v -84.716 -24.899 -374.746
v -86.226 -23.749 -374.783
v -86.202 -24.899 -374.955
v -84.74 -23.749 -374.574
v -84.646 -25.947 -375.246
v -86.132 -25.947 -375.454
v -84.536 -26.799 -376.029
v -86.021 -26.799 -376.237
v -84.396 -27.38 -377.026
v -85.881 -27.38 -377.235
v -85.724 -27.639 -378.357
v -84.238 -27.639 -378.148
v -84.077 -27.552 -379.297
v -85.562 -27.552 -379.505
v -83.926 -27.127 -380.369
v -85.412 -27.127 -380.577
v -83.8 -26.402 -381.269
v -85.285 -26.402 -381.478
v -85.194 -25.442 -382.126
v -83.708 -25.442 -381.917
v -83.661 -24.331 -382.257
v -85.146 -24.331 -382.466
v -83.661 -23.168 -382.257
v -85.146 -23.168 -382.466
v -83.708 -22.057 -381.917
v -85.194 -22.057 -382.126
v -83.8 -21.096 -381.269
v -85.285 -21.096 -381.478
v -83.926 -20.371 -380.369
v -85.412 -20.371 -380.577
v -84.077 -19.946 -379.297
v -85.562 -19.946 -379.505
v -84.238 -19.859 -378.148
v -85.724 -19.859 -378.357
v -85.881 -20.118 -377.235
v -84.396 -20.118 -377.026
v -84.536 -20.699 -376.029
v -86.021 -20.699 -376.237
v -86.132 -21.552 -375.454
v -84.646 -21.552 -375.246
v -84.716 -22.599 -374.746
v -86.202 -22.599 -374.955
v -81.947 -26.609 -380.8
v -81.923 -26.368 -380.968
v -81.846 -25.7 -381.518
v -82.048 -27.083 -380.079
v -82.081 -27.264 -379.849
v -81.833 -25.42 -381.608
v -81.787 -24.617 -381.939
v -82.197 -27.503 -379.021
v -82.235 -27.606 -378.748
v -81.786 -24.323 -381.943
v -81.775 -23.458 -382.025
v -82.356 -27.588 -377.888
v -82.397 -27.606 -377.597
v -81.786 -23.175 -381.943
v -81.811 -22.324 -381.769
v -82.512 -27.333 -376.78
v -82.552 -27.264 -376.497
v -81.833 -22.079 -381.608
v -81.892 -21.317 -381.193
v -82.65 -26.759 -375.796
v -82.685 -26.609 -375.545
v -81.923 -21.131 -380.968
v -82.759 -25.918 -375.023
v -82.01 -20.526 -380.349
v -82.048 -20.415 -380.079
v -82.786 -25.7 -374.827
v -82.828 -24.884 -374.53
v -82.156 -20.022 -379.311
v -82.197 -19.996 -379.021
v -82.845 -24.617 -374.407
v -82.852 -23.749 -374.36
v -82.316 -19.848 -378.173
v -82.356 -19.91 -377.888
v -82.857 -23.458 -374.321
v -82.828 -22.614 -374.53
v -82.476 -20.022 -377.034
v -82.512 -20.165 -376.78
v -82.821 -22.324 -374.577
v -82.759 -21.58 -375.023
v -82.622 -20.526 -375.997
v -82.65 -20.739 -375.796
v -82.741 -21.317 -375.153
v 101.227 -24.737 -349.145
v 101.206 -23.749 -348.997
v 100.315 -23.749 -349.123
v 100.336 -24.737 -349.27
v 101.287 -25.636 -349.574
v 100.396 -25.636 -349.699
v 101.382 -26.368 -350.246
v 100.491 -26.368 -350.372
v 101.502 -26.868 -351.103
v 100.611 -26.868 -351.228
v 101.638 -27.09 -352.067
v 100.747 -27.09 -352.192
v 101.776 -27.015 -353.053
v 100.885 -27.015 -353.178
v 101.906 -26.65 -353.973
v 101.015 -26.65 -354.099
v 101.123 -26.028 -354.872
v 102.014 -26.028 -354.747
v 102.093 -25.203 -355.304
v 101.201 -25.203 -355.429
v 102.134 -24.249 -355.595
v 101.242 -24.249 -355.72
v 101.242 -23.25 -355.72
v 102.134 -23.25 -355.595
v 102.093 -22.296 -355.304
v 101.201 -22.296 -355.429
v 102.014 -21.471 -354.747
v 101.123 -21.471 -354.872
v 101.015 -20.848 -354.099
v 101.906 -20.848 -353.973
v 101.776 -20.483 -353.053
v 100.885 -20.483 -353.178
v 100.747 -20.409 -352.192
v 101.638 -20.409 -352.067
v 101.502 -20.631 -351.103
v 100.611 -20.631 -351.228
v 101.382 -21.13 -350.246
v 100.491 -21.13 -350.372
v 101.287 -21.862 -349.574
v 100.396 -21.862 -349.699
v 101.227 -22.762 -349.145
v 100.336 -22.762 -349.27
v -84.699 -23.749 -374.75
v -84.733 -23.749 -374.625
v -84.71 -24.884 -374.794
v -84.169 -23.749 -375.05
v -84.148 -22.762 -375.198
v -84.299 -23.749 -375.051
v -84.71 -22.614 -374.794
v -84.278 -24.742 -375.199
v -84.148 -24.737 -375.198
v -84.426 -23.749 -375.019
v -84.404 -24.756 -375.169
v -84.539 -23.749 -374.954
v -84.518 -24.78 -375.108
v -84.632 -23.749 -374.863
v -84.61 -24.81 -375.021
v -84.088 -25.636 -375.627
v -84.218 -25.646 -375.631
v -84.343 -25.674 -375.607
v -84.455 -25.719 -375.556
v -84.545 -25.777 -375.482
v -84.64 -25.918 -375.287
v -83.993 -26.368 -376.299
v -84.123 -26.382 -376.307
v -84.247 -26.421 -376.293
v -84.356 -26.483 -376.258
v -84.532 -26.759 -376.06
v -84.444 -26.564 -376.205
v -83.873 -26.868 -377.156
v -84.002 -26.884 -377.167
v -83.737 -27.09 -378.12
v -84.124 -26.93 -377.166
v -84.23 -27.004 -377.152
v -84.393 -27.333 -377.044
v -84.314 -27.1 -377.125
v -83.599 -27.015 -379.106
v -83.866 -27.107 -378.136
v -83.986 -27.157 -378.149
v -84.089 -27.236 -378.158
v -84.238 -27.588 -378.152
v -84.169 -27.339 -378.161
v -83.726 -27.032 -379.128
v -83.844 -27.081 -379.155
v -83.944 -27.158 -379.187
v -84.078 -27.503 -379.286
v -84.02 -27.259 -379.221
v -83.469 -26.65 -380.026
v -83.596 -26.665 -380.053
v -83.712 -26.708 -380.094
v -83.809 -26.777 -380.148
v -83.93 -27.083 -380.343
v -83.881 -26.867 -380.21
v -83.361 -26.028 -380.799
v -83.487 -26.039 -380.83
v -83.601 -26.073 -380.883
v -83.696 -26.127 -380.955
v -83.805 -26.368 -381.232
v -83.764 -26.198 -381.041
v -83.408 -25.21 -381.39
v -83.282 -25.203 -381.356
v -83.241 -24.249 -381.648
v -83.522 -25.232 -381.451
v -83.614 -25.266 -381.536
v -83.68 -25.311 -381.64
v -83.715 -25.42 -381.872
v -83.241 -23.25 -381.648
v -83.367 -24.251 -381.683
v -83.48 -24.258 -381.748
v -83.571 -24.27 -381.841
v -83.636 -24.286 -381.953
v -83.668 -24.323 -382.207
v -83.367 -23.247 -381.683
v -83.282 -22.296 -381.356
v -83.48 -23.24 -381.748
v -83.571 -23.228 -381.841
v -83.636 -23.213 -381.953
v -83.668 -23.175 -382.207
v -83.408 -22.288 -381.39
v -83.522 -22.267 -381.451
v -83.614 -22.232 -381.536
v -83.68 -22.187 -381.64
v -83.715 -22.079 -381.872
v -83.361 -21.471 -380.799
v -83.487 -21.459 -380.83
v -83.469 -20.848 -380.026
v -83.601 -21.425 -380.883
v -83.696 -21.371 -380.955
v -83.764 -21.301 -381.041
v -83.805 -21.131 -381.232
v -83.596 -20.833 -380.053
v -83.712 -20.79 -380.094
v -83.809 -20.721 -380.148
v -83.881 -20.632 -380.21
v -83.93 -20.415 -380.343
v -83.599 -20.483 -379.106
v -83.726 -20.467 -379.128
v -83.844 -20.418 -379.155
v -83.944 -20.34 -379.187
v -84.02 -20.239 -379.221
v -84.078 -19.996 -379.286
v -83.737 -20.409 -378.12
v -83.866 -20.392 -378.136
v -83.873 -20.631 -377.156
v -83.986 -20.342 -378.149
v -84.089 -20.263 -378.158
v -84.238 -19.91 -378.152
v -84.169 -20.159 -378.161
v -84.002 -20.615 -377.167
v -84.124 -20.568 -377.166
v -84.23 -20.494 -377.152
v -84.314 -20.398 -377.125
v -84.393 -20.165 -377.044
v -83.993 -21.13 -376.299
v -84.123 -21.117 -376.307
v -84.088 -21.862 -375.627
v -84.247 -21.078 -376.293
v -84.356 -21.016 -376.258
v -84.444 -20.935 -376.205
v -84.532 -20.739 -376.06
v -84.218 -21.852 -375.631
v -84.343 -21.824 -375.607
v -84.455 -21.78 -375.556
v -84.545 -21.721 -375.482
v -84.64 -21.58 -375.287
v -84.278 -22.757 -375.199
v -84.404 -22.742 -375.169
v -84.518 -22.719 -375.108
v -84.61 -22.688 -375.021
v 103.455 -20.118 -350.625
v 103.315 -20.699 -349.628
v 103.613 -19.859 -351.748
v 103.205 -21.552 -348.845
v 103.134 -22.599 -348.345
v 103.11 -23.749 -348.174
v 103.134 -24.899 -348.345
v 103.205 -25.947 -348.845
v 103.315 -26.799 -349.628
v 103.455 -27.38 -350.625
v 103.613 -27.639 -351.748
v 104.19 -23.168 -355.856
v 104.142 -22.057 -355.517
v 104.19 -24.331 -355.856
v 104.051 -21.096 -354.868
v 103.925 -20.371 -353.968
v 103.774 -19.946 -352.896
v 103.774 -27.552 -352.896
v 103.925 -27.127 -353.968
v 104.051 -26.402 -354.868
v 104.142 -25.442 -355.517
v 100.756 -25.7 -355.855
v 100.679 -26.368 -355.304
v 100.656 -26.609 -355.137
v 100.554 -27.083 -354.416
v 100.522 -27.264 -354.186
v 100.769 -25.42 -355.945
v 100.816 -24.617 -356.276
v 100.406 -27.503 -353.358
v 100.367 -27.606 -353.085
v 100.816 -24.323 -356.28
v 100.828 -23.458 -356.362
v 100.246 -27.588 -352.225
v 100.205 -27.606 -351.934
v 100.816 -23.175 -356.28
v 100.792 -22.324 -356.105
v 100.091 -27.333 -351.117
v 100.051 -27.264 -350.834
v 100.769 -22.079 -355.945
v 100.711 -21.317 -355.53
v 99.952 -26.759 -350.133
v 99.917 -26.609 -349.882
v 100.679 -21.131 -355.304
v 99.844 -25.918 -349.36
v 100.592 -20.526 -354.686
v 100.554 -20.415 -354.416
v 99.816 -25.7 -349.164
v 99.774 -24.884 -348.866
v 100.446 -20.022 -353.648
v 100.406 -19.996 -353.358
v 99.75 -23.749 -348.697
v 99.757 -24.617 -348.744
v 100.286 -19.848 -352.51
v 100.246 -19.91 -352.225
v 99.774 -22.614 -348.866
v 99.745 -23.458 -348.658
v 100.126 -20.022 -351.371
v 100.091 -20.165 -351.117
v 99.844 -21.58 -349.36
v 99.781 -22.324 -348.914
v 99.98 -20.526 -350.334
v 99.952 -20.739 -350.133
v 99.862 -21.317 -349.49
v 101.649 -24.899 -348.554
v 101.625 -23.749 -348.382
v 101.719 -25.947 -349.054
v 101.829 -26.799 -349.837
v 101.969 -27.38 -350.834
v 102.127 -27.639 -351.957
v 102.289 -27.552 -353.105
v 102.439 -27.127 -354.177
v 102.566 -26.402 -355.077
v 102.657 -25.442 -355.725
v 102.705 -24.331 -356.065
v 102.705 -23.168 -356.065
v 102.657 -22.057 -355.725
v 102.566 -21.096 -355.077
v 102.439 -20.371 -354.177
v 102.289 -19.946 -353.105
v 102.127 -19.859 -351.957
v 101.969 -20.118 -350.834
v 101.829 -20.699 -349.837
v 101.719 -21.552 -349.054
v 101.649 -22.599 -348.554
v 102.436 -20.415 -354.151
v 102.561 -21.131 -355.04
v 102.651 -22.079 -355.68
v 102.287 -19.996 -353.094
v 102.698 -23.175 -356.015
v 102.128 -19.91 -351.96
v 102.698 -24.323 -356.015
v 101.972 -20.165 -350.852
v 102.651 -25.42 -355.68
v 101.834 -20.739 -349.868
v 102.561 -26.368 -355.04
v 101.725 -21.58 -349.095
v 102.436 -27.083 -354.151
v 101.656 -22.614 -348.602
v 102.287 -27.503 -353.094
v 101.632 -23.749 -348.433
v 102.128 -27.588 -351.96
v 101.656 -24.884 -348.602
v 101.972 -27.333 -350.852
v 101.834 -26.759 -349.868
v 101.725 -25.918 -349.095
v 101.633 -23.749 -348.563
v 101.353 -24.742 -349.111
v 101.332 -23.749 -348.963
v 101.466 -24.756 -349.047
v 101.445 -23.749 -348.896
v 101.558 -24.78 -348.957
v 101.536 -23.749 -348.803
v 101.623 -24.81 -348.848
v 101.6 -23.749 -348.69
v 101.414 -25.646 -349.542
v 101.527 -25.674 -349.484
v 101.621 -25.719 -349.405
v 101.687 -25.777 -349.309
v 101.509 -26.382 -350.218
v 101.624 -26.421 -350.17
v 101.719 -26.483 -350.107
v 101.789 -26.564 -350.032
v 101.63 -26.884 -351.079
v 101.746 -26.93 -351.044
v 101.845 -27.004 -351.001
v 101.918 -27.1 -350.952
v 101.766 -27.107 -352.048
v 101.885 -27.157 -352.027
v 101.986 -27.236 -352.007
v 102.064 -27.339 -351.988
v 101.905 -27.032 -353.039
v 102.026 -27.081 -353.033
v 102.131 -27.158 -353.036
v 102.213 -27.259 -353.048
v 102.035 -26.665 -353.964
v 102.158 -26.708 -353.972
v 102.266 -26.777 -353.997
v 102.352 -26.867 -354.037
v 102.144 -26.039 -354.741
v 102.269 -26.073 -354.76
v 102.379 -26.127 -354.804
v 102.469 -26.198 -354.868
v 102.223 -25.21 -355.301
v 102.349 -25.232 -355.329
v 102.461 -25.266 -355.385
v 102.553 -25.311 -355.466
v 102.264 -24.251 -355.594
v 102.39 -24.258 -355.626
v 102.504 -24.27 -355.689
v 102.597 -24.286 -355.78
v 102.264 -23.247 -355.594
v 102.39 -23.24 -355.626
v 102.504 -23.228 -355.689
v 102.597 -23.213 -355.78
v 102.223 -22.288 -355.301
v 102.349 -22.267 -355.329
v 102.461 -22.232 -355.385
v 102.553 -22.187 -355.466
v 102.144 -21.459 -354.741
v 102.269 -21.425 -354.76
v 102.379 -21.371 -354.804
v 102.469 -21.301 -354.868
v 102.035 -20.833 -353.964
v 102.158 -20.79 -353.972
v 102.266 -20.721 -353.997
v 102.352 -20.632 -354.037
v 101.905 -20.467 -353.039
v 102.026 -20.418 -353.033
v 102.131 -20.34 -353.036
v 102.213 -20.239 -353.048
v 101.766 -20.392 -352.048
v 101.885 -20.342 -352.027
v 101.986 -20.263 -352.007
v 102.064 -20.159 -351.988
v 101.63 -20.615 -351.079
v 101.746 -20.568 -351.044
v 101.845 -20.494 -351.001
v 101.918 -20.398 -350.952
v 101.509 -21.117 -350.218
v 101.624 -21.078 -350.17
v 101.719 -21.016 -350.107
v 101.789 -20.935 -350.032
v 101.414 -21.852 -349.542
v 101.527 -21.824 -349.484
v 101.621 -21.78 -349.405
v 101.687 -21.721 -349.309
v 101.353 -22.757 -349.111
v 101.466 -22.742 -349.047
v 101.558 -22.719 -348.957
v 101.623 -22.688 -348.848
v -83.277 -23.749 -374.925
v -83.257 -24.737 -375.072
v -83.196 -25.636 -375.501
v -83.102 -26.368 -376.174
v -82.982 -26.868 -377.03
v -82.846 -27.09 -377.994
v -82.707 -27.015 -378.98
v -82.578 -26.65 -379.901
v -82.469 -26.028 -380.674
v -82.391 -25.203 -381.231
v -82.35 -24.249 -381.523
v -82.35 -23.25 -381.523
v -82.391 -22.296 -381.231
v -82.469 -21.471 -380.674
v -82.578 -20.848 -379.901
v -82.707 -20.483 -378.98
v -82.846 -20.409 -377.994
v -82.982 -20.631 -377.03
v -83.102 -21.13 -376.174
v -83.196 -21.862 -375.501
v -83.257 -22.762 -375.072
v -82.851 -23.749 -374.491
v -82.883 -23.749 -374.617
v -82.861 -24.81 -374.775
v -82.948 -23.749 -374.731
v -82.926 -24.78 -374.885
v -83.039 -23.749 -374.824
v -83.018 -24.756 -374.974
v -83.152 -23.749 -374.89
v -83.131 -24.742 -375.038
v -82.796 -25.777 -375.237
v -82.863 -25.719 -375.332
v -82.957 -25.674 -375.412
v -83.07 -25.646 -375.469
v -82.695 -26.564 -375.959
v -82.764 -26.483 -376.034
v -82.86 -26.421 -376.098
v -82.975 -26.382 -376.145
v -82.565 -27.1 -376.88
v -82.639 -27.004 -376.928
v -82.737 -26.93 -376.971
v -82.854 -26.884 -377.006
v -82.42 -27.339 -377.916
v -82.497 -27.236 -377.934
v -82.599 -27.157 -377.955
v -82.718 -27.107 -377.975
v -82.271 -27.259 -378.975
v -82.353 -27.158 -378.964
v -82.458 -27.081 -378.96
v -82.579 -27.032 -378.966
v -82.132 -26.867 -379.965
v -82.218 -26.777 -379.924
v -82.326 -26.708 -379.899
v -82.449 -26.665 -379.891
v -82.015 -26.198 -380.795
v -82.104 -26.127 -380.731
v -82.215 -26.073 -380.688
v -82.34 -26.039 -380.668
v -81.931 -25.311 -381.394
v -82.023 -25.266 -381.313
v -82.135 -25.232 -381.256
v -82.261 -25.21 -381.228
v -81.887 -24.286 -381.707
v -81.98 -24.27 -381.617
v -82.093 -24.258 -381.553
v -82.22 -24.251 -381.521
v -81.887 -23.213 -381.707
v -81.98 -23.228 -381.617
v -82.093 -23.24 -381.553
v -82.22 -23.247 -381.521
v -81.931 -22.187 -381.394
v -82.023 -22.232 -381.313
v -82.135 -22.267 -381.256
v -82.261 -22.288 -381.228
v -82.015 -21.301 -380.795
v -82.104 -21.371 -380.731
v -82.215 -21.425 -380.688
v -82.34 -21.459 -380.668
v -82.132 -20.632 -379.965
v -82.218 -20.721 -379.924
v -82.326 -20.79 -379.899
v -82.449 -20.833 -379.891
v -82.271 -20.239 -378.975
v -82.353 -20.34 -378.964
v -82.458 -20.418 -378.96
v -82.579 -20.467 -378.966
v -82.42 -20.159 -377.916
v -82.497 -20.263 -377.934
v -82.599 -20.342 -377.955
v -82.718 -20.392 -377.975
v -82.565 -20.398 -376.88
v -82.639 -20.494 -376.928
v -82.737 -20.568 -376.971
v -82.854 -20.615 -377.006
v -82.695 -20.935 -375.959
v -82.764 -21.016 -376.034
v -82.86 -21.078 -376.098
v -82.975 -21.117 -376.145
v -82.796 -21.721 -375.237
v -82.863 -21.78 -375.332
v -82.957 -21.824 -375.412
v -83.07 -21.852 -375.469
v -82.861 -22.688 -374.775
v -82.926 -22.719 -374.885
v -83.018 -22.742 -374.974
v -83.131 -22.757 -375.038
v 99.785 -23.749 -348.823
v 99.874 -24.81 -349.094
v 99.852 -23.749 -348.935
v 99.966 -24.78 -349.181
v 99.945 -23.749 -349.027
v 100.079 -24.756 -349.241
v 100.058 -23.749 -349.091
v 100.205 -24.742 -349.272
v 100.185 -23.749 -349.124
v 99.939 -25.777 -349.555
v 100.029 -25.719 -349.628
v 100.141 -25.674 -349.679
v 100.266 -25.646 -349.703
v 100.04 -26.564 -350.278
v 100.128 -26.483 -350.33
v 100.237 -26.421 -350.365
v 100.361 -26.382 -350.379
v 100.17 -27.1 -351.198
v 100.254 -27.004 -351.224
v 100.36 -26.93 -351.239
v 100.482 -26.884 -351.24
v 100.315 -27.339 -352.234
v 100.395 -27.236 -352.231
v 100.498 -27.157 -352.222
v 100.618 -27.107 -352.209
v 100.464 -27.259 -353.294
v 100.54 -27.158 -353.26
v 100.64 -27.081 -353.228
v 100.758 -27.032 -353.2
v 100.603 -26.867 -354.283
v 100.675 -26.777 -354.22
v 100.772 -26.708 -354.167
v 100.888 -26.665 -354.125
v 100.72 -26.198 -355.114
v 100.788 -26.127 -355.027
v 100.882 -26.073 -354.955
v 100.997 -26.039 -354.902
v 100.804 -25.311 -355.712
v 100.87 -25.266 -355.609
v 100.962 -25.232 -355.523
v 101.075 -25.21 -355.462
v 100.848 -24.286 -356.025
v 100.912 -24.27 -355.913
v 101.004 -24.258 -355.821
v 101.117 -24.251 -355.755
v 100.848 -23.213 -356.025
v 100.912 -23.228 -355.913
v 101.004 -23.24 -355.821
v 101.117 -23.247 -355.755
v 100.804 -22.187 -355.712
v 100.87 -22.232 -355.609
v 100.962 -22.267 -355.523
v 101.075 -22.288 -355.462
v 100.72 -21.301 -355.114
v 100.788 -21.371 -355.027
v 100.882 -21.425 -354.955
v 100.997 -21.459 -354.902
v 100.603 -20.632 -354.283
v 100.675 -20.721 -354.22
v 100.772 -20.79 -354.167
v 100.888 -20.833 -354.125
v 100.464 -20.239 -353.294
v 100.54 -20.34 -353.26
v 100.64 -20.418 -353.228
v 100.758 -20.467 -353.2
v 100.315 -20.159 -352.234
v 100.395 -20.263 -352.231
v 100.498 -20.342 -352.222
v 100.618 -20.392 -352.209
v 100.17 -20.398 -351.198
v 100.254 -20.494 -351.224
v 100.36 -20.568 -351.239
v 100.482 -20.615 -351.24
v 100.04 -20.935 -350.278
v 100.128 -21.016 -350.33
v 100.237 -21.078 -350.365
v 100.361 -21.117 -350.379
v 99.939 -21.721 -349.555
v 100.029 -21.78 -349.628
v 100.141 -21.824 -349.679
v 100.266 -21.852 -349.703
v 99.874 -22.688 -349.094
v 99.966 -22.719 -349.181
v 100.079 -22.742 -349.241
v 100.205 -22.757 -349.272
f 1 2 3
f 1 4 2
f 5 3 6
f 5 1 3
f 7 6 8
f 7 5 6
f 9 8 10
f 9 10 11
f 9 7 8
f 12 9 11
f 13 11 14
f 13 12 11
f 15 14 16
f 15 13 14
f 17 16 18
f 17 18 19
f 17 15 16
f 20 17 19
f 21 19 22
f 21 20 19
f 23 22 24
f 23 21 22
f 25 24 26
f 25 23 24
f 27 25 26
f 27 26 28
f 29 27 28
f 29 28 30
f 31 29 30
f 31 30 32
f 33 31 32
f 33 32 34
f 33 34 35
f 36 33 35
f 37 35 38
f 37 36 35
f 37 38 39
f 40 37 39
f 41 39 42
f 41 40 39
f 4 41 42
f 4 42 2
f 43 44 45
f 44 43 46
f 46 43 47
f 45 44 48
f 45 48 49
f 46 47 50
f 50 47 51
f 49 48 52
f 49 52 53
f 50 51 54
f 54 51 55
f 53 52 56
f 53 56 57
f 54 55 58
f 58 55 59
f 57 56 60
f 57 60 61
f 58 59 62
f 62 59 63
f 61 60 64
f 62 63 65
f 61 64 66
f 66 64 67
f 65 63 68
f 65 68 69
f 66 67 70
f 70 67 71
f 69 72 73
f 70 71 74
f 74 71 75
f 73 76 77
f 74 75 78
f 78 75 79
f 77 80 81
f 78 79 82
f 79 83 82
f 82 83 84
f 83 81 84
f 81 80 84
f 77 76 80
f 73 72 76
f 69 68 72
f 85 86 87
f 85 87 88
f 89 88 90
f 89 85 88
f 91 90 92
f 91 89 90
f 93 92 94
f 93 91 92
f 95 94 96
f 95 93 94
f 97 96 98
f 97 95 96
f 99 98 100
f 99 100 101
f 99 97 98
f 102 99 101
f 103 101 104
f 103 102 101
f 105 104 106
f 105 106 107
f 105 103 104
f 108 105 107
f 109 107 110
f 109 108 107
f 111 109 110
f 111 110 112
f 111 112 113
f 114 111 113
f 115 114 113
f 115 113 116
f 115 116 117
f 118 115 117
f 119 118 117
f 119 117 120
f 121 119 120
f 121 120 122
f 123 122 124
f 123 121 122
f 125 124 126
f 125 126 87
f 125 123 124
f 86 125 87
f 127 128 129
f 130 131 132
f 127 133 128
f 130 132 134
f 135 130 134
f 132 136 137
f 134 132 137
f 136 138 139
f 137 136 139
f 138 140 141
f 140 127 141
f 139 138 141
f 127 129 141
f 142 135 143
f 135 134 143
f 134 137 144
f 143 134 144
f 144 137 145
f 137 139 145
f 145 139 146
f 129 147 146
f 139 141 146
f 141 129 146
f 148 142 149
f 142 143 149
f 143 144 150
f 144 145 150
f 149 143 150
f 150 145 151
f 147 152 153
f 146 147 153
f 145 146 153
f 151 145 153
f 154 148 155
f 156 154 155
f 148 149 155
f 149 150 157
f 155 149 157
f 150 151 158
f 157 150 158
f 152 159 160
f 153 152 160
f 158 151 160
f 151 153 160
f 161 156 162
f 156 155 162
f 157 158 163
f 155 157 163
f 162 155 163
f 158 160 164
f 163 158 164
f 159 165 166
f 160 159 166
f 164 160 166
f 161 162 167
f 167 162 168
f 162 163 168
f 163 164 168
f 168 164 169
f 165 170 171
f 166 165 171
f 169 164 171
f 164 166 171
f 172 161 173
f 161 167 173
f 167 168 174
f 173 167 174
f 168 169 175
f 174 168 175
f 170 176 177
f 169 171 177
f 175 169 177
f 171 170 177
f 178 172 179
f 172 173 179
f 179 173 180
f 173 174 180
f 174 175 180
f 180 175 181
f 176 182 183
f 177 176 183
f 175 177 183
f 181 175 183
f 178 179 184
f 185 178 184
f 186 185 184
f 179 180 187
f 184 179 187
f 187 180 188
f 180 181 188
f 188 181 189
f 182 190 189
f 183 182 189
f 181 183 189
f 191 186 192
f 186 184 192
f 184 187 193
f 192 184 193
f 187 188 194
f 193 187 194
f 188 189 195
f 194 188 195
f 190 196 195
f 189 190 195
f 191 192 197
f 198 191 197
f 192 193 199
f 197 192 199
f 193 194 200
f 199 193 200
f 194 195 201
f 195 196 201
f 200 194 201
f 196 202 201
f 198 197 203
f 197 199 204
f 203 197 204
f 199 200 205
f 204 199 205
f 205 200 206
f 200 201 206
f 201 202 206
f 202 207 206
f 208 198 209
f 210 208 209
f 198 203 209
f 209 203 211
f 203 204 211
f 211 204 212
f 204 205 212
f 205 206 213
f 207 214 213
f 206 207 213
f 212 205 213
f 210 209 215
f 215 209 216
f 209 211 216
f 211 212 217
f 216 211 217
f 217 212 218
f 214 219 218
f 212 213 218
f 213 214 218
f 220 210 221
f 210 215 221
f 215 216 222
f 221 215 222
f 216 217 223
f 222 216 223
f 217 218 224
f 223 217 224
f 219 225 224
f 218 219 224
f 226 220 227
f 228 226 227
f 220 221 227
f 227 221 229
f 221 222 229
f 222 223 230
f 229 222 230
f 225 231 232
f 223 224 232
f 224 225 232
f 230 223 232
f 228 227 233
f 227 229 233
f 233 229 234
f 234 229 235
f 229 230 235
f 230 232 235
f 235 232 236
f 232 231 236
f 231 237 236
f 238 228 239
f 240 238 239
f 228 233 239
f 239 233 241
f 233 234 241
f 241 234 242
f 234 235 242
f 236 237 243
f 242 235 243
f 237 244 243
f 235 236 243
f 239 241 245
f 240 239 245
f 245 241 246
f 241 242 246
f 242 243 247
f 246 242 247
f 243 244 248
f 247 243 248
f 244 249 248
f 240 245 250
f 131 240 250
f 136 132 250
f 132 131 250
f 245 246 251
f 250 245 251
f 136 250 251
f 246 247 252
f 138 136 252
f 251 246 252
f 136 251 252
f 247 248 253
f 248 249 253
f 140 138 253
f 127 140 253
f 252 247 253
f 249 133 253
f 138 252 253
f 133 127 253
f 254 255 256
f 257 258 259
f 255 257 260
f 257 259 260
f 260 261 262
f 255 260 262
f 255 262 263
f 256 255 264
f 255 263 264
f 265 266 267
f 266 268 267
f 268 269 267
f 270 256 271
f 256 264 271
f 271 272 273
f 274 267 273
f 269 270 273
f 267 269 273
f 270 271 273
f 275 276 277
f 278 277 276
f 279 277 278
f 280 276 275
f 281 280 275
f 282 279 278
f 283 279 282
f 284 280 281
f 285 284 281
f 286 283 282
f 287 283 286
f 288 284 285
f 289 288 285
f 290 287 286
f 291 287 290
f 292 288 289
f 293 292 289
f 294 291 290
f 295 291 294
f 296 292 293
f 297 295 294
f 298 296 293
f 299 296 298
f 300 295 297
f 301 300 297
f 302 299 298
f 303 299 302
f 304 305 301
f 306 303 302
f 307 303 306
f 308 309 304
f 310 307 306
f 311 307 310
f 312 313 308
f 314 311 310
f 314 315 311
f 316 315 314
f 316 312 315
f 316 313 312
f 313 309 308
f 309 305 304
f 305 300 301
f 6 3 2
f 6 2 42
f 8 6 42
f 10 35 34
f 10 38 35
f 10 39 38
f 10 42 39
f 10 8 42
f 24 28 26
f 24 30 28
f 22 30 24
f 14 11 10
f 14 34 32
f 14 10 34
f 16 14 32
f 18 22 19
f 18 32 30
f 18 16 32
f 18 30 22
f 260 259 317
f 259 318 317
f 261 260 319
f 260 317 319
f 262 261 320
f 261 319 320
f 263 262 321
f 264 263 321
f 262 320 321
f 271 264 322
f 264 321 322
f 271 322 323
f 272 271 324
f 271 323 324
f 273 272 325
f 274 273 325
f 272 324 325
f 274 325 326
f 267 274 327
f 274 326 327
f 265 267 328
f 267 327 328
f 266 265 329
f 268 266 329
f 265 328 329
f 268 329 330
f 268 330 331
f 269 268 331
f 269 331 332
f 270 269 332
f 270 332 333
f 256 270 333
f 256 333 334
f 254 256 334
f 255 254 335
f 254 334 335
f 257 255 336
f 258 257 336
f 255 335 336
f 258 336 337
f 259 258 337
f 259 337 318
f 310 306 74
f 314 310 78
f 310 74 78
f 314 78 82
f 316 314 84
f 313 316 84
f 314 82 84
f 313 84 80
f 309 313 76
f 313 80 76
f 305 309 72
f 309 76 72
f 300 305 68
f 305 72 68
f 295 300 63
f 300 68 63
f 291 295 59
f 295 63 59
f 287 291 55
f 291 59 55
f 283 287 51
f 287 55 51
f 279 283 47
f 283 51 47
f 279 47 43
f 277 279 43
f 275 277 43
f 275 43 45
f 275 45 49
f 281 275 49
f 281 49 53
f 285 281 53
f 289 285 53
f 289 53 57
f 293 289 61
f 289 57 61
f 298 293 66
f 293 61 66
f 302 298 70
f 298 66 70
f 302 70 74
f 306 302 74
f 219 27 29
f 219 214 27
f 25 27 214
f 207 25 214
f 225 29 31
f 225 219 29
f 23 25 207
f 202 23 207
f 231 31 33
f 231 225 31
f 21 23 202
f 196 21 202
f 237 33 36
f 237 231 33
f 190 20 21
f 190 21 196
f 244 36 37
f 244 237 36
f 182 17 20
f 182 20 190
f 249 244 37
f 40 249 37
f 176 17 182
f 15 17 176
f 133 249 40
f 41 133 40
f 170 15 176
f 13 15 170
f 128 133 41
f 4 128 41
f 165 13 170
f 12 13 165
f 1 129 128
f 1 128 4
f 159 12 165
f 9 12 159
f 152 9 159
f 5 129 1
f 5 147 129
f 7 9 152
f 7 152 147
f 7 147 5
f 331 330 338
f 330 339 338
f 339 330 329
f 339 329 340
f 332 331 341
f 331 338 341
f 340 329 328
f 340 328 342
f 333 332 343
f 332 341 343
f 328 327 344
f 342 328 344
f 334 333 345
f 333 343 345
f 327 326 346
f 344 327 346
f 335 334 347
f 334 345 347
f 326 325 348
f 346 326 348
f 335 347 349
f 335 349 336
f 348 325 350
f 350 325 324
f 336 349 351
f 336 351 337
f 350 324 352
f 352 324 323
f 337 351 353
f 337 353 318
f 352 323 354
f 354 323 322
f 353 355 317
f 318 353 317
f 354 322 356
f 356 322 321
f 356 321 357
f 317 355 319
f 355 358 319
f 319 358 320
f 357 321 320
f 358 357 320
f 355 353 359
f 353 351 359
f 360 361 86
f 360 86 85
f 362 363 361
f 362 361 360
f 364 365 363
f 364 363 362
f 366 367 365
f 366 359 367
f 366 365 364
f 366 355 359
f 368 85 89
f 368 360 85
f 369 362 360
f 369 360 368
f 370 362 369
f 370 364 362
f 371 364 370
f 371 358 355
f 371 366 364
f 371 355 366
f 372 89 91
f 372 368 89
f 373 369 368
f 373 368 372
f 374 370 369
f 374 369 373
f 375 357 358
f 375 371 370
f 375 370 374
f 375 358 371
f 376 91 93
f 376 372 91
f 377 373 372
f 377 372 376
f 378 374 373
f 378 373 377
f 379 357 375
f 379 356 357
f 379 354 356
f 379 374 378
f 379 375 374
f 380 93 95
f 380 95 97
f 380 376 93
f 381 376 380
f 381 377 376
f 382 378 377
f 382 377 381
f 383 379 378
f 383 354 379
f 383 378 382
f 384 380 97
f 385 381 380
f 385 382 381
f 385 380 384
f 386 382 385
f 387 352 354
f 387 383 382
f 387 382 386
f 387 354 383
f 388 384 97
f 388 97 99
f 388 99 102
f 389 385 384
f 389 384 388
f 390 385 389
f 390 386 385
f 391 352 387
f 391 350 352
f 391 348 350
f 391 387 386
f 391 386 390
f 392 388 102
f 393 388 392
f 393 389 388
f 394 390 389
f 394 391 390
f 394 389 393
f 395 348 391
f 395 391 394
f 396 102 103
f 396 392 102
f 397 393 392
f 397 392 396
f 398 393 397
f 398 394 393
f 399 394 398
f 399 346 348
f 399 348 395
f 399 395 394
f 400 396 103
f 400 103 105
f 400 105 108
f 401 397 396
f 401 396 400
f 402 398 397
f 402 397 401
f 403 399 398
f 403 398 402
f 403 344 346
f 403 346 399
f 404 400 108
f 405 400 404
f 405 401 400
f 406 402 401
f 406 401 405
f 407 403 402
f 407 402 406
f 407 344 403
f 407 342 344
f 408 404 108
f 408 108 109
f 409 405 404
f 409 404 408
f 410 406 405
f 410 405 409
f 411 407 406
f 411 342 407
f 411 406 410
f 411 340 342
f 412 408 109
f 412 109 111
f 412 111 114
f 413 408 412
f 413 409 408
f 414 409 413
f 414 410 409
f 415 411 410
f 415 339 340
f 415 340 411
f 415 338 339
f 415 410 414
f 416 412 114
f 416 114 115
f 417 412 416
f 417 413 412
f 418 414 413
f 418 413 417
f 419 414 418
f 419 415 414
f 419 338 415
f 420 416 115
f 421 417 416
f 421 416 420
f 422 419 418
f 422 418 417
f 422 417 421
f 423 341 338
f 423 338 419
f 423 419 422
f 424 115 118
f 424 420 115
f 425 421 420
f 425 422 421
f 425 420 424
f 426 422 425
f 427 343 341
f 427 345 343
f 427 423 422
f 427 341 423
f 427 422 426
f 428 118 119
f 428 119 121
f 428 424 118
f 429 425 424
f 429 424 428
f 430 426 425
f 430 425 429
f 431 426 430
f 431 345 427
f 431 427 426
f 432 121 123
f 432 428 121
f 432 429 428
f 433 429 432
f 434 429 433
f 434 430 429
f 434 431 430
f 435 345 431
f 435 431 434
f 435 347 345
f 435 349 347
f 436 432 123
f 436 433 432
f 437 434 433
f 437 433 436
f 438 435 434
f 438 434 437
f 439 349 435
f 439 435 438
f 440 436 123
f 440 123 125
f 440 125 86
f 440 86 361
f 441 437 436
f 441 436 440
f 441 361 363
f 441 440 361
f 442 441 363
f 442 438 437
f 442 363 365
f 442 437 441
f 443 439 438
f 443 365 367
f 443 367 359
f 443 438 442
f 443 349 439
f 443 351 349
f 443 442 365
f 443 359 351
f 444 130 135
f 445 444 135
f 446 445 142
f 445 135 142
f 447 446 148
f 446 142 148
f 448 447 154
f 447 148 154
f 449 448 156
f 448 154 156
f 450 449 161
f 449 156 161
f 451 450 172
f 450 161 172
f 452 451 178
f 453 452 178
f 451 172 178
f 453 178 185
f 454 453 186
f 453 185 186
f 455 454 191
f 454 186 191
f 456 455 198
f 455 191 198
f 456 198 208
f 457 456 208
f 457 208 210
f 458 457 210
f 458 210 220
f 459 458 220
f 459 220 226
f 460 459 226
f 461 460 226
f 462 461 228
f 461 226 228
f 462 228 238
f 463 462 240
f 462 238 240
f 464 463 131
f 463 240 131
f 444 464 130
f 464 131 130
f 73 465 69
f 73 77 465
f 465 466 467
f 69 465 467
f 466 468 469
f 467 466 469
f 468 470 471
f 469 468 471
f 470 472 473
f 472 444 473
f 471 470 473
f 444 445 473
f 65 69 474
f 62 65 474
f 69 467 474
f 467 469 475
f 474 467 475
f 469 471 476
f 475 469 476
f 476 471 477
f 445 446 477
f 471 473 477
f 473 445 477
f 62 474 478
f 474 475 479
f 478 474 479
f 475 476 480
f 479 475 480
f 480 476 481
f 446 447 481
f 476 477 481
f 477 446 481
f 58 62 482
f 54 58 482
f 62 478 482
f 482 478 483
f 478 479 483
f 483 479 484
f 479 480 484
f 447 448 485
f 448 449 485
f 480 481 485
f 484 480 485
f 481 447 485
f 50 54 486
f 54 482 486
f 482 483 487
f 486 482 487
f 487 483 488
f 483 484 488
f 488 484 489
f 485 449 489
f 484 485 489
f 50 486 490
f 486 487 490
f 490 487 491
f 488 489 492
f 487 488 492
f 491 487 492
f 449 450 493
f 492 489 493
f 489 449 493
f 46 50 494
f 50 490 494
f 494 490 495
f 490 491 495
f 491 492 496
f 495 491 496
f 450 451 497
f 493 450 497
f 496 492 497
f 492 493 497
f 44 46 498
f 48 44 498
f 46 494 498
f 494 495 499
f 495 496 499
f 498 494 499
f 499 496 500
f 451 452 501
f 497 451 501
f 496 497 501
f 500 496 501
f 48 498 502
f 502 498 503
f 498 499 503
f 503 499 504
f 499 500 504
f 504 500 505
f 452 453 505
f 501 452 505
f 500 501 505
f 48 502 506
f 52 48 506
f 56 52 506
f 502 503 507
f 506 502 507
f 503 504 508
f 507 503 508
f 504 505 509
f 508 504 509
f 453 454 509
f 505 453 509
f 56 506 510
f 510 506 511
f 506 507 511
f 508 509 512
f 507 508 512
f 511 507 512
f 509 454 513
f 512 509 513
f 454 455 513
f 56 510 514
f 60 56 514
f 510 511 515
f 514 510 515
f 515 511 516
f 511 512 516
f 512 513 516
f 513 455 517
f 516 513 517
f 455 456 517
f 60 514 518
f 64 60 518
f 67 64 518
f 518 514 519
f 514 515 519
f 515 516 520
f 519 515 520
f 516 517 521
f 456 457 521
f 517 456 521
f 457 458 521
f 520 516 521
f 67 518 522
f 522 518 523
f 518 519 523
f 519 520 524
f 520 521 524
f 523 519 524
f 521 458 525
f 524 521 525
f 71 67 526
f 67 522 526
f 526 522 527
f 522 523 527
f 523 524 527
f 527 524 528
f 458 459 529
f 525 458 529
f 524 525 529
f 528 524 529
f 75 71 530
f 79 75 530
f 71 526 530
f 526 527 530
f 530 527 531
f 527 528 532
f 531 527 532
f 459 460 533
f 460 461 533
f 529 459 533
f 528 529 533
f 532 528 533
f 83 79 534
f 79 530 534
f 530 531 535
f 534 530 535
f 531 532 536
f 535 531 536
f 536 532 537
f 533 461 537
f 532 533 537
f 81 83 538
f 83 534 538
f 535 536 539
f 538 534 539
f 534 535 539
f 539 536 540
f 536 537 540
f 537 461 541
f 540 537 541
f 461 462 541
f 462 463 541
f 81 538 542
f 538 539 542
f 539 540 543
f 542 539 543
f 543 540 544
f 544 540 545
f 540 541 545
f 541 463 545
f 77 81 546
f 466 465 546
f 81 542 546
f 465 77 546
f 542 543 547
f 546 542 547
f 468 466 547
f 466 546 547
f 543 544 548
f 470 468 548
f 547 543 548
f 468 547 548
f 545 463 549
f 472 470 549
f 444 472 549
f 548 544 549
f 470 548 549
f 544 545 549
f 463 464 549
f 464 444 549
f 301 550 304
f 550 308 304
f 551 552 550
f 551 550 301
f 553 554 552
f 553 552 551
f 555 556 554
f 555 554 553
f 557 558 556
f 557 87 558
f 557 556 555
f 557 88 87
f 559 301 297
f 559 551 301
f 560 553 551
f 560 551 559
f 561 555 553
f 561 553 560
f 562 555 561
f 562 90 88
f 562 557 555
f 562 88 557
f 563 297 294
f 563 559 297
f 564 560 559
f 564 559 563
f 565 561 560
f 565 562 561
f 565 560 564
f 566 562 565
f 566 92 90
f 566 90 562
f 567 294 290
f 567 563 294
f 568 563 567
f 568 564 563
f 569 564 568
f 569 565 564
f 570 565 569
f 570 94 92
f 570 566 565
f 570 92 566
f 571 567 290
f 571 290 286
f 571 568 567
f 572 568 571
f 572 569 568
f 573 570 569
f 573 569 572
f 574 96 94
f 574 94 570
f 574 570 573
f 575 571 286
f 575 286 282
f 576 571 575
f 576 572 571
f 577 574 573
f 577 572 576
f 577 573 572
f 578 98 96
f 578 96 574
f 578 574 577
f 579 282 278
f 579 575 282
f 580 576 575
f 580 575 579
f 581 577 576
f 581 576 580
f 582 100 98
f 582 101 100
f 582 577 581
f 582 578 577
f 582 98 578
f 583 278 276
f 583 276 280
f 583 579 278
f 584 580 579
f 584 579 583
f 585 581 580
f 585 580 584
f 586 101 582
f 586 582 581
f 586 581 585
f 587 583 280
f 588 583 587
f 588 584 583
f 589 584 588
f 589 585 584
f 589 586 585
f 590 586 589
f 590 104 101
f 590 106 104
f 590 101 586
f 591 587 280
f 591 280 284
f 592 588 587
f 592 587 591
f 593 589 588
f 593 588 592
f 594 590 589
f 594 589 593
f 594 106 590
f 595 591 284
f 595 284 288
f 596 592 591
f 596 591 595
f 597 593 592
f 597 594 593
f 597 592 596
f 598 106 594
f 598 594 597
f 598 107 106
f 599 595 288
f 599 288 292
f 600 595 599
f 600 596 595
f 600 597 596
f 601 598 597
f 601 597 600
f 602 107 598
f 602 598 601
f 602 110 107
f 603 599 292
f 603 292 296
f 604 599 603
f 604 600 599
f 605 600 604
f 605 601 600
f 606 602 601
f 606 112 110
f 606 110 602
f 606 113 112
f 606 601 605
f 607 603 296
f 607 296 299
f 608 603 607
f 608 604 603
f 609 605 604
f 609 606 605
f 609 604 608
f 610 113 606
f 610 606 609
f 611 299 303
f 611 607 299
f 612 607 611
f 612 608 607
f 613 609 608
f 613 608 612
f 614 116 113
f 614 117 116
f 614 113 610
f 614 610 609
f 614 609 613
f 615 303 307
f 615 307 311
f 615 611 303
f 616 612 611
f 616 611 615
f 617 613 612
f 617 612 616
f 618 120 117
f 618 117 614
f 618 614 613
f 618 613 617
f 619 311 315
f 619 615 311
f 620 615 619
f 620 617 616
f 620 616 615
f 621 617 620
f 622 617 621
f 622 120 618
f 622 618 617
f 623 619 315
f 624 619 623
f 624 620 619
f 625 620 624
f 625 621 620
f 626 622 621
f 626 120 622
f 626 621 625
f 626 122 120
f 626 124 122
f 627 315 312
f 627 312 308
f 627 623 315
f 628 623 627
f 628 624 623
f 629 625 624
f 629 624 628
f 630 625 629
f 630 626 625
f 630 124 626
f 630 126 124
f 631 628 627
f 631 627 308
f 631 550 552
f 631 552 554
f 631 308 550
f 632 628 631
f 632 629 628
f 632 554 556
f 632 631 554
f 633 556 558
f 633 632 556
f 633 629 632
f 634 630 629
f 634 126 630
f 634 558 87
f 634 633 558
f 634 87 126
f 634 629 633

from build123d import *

# Parameters (mm, degrees)
BOSS_EXTRUDE1_START     = -134.1464368
BOSS_EXTRUDE1_OUTLINE_R = 3.90078125
BOSS_EXTRUDE1_DEPTH     = 184.396875
SKETCH40_W              = 3.35
SKETCH40_H              = 1.9
FILLET1_R               = 0.5


# Read off the part's stored shape, not the designer's step: Boss-Extrude1
with BuildPart() as part:
    # Boss-Extrude1 outline → Boss-Extrude1 (new body)
    with BuildSketch(Plane(origin=(0, 0, 0), x_dir=(0, 1, 0), z_dir=(0.9902680687415714, 0, 0.13917310096005805)).offset(BOSS_EXTRUDE1_START)):
        with Locations((-23.74921875, -363.03618928)):
            Circle(BOSS_EXTRUDE1_OUTLINE_R)
    extrude(amount=BOSS_EXTRUDE1_DEPTH)

    # Sketch40 → Revolve1 (revolve)
    with BuildSketch(Plane(origin=(0, -23.74921875, 0), x_dir=(-0.13917310096005797, 0, 0.9902680687415715), z_dir=(0, 1, 0)), mode=Mode.PRIVATE) as revolve1_sk:
        with Locations((-364.71118928, 51.2004382)):
            Rectangle(SKETCH40_W, SKETCH40_H)
        Polygon((-366.93697053, 52.1504382), (-366.38618928, 52.1504382), (-363.03618928, 52.1504382), (-363.03618928, 53.6504382), (-366.93697053, 53.6504382), align=None)
    revolve(revolve1_sk.sketch.rotate(Axis((-198147.883122307, -23.74921875, -28214.472842277), (0.9902680687415714, 0, 0.1391731009600579)), 180), axis=Axis((-198147.883122307, -23.74921875, -28214.472842277), (0.9902680687415714, 0, 0.1391731009600579)))

    # Fillet1
    fillet1_edges = [part.edges().sort_by_distance(p)[0] for p in [
        (100.752506501, -23.74921875, -355.827034763),
        (102.634015832, -23.74921875, -355.562605871),
    ]]
    fillet(fillet1_edges, radius=FILLET1_R)

    # Mirror2: part across plane


with BuildPart() as part_1:
    add(part.part)
    add(part.part.mirror(Plane(origin=(-41.539764254, 0, -5.838033142), x_dir=(-0.13917310096005794, 0, 0.9902680687415714), z_dir=(0.9902680687415714, 0, 0.13917310096005794))))


solid = part_1.part
